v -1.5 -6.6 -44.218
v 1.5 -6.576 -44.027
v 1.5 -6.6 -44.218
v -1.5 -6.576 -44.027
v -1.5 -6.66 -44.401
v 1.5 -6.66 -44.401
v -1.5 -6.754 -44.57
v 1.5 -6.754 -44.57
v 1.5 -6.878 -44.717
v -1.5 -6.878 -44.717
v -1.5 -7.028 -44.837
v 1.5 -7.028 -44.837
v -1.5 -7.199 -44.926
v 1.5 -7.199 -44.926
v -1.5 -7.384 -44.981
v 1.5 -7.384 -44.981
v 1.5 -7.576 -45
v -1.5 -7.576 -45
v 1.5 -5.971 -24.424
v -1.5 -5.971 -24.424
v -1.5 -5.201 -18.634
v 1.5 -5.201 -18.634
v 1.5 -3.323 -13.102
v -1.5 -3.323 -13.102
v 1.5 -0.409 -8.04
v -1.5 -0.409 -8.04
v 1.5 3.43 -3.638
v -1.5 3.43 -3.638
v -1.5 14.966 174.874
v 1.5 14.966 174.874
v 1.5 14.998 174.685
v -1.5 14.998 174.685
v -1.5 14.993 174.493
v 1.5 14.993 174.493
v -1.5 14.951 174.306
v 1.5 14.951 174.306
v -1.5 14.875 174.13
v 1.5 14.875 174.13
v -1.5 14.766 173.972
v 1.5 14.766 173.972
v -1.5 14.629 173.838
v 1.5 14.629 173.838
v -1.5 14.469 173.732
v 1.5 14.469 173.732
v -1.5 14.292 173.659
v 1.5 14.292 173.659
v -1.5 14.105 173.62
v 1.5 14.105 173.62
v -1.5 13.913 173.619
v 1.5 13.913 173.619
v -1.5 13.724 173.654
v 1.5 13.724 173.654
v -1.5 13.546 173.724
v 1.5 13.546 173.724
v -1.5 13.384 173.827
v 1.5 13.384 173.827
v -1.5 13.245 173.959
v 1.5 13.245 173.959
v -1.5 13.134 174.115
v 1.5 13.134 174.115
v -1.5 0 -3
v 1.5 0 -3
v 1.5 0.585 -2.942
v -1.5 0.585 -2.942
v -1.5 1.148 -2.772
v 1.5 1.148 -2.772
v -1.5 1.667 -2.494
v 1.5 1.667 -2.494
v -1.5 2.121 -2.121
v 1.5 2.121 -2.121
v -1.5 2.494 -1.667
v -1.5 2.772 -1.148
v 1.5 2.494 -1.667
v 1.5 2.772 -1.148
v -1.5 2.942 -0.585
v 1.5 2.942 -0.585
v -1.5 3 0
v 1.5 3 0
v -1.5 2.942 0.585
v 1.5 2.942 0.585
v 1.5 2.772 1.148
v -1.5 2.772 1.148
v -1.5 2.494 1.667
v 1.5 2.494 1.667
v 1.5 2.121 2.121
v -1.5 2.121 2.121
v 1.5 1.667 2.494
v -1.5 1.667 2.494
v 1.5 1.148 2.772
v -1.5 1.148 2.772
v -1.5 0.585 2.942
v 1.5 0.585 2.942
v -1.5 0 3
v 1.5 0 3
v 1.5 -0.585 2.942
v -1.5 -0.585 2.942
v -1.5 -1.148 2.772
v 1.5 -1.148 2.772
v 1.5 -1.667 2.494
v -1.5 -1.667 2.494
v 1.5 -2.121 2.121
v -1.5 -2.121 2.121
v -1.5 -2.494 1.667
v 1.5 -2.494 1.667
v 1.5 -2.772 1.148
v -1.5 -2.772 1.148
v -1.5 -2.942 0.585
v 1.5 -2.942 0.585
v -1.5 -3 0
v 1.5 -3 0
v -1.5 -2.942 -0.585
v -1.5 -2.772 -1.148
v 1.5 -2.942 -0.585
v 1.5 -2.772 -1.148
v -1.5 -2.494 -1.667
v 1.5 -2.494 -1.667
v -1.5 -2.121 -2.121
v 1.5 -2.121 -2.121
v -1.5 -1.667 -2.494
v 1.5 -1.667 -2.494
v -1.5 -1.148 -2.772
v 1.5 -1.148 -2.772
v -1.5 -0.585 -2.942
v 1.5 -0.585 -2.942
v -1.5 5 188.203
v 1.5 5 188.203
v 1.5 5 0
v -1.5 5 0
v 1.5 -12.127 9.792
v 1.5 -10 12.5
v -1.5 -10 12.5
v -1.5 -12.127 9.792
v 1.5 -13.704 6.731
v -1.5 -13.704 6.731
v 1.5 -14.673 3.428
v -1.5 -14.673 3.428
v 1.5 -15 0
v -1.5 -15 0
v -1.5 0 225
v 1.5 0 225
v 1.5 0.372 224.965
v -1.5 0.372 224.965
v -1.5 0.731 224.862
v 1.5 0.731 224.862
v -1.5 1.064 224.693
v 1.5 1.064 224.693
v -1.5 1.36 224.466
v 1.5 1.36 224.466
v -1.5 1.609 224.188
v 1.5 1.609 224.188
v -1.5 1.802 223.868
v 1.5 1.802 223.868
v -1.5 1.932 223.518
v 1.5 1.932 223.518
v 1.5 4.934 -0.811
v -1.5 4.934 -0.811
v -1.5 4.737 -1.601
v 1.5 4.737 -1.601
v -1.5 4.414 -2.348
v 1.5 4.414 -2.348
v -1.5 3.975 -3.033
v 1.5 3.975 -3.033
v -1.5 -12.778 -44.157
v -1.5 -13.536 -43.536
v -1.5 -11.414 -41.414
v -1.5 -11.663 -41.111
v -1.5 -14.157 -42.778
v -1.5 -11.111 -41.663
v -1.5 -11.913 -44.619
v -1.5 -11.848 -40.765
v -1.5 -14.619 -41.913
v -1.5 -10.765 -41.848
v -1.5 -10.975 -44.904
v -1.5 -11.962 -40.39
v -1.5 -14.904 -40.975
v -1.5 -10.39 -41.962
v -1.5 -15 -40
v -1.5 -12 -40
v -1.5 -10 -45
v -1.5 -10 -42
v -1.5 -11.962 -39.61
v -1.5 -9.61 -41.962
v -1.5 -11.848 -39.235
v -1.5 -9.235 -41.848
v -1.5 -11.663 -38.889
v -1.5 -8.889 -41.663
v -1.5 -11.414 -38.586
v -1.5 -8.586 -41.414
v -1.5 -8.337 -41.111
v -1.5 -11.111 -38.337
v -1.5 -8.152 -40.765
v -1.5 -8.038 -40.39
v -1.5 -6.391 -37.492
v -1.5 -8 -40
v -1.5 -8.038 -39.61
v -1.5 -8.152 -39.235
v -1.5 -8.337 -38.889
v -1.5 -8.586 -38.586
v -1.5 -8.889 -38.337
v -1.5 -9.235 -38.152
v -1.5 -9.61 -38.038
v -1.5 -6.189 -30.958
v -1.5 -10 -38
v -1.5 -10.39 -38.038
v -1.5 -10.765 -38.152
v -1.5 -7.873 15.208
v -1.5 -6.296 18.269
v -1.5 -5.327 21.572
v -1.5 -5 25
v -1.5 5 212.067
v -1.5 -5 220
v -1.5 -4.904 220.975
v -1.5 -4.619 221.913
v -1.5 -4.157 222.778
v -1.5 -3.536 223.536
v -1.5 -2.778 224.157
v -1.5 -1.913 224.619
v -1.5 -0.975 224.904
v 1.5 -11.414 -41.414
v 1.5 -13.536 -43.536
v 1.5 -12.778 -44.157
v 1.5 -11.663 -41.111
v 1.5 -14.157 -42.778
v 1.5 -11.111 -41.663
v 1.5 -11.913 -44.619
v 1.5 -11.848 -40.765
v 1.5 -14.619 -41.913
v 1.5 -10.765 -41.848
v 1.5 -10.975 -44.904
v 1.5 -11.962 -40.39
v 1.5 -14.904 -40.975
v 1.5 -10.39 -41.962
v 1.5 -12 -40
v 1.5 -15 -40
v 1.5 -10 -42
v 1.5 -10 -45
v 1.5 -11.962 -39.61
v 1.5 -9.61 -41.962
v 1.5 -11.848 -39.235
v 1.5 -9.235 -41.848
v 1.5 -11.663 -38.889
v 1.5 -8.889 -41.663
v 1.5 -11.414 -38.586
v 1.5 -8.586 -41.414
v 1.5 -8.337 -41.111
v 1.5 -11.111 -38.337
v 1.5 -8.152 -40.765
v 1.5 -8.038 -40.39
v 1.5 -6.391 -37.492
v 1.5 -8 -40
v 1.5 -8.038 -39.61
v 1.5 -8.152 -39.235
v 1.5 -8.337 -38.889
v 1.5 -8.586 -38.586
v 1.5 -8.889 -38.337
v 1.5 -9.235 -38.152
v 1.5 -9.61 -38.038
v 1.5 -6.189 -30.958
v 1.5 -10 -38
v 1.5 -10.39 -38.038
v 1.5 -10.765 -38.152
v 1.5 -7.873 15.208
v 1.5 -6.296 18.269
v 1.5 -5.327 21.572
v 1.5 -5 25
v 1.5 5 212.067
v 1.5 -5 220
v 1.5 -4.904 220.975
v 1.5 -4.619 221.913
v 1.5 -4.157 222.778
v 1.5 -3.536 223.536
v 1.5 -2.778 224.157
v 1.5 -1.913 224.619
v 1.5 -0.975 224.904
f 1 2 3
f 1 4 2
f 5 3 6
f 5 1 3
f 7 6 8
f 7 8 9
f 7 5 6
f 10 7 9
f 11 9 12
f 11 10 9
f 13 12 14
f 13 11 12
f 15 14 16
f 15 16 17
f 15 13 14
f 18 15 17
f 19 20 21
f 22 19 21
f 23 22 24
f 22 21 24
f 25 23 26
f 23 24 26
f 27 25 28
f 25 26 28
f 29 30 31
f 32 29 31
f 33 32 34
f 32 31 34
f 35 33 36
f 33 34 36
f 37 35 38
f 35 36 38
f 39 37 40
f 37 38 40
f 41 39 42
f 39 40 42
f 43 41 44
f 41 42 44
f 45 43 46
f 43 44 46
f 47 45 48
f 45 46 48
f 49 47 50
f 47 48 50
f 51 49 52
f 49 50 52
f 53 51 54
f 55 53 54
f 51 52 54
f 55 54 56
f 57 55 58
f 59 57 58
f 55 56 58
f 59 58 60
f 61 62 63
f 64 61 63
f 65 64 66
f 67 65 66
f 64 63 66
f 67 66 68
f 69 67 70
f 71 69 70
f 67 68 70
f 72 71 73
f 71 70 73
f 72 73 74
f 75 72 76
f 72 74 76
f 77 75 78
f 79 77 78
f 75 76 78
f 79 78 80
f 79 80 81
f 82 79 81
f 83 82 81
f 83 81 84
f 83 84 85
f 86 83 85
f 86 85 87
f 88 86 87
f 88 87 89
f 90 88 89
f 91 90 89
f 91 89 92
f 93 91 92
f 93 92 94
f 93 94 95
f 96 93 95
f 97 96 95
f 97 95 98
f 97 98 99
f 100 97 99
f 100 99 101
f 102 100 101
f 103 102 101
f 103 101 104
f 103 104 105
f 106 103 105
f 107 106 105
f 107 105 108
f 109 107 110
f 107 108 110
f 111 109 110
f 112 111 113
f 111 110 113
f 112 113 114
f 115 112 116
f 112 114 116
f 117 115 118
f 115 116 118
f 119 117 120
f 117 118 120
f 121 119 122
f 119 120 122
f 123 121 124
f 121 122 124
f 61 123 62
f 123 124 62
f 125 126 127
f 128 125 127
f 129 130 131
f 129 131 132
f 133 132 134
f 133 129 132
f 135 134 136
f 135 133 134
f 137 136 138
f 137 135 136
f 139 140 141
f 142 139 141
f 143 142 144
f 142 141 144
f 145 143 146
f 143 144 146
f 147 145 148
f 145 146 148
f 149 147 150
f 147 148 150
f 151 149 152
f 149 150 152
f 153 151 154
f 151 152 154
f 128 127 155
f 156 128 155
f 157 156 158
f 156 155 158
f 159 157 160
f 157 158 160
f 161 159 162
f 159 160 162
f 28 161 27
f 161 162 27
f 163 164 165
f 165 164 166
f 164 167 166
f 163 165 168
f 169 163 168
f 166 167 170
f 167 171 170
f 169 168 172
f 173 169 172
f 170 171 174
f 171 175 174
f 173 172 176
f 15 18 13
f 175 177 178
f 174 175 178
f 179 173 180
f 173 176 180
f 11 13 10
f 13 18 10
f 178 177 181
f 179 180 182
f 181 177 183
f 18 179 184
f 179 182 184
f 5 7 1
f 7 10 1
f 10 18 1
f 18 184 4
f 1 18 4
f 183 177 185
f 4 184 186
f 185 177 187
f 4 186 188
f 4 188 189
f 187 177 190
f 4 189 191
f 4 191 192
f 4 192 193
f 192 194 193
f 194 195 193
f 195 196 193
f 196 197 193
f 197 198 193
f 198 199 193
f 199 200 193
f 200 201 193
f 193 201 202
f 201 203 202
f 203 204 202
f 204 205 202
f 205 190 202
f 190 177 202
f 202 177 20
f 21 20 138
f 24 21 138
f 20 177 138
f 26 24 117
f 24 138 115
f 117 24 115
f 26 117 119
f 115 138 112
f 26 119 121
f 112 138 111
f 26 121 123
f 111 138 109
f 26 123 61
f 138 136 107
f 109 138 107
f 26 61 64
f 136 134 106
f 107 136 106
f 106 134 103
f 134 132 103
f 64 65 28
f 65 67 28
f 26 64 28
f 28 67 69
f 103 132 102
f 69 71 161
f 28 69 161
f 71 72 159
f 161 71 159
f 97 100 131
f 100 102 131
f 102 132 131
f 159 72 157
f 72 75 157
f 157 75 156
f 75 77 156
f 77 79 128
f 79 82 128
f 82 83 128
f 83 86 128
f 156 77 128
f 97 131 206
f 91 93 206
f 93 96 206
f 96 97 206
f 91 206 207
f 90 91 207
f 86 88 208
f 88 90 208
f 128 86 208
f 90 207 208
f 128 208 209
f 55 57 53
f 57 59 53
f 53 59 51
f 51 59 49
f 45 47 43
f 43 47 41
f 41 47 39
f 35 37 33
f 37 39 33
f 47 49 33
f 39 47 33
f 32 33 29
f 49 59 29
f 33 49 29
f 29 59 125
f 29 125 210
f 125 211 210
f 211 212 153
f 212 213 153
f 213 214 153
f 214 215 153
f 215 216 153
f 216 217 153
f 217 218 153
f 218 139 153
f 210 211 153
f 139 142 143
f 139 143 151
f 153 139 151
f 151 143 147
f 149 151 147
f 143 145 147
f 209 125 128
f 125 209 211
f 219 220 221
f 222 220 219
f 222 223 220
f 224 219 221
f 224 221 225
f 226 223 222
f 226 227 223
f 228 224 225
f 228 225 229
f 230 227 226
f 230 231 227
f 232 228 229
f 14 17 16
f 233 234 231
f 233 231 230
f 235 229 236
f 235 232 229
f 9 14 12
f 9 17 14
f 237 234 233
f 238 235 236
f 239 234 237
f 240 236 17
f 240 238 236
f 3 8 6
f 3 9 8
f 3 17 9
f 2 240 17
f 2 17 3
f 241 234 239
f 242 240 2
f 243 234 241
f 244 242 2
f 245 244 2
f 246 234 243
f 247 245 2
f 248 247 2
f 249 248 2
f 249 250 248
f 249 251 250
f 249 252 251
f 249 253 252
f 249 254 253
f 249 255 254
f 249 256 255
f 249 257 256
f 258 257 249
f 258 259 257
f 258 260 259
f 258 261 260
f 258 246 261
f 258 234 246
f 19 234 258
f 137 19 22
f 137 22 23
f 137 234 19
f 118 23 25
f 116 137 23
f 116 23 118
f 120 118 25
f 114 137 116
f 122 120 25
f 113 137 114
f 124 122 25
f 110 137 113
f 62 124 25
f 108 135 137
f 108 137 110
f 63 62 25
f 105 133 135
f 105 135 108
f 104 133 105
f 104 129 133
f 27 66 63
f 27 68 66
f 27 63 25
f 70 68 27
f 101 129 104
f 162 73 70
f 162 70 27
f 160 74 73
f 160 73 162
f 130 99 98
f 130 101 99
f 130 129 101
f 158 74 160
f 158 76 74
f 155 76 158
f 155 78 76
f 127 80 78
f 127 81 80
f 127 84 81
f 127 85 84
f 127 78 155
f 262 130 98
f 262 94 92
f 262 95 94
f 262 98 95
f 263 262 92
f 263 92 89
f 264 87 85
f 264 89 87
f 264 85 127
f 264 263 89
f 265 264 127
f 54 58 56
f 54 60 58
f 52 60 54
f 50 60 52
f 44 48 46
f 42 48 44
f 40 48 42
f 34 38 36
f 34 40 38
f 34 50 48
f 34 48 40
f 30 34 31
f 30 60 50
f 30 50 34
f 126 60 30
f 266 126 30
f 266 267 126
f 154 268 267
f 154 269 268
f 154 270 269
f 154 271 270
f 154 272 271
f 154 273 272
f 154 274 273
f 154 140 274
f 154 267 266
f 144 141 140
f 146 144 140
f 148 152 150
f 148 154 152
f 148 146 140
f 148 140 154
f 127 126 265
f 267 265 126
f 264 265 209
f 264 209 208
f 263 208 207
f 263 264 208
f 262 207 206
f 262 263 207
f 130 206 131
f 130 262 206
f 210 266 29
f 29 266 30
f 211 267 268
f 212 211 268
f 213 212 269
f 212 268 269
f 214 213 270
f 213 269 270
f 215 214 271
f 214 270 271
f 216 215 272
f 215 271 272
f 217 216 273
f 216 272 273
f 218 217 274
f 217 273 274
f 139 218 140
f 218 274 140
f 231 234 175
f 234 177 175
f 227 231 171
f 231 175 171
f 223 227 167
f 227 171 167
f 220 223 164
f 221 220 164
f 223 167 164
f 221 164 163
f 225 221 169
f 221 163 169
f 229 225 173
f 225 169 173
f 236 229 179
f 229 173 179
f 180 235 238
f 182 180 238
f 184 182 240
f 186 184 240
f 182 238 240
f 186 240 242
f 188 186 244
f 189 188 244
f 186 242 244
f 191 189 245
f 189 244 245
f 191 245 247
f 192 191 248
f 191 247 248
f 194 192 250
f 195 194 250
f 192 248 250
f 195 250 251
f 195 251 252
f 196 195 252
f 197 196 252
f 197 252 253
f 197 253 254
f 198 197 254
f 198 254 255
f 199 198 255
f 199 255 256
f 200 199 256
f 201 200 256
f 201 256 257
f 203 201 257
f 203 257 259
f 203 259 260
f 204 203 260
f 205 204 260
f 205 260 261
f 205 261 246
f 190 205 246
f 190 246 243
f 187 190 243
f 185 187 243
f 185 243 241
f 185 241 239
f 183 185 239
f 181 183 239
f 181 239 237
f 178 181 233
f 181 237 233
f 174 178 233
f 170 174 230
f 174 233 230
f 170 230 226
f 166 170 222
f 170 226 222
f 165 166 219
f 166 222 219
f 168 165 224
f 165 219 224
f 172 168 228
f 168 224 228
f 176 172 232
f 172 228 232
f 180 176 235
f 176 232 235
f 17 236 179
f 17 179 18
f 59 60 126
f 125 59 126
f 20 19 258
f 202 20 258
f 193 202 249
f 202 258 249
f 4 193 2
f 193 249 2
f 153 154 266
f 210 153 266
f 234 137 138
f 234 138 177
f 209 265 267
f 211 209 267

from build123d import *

# Parameters (mm, degrees)
EXTRUDE_1_DEPTH     = 1.5
EXTRUDE_2_DEPTH     = 3
CUT_EXTRUDE_1_DEPTH = 226.519400496
SKETCH_4_W          = 70
SKETCH_4_H          = 10
EXTRUDE_3_DEPTH     = 3
CUT_EXTRUDE_2_DEPTH = 226.519400496
FILLET_1_R          = 5
FILLET_START        = -1.5
FILLET_2_DEPTH      = 3
FILLET_3_R          = 1
CUT_EXTRUDE_3_DEPTH = 226.519400496
SKETCH_7_R          = 3
CUT_EXTRUDE_4_DEPTH = 226.519400496
SKETCH_8_R          = 2
CUT_EXTRUDE_5_DEPTH = 226.519400496


with BuildPart() as part:
    # ｽｹｯﾁ1 → ﾎﾞｽ - 押し出し1 (new, symmetric)
    with BuildSketch(Plane(origin=(0, 0, 0), x_dir=(0, 0, -1), z_dir=(1, 0, 0))):
        with BuildLine():
            Line((0, -5), (-220, -5))
            ThreePointArc((-220, -5), (-225, 0), (-220, 5))
            Line((-220, 5), (0, 5))
            ThreePointArc((0, 5), (5, 0), (0, -5))
        make_face()
    extrude(amount=EXTRUDE_1_DEPTH, both=True)

    # ｽｹｯﾁ2 → ﾎﾞｽ - 押し出し2 (add)
    with BuildSketch(Plane(origin=(1.5, 0, 0), x_dir=(0, 0, -1), z_dir=(1, 0, 0))):
        with BuildLine():
            Line((-223.51763809, 1.931851653), (-174.873811044, 14.965925826))
            ThreePointArc((-174.873811044, 14.965925826), (-173.691112467, 14.382683432), (-174.114991999, 13.133974596))
            Line((-174.114991999, 13.133974596), (-196.863703305, 0))
            Line((-196.863703305, 0), (-225, 0))
            ThreePointArc((-225, 0), (-224.586706681, 1.217522858), (-223.51763809, 1.931851653))
        make_face()
    extrude(amount=-EXTRUDE_2_DEPTH)

    # ｽｹｯﾁ3 → ｶｯﾄ - 押し出し1 (cut, through all)
    with BuildSketch(Plane(origin=(1.5, 0, 0), x_dir=(0, 0, -1), z_dir=(1, 0, 0))):
        with BuildLine():
            Line((-223.51763809, 1.931851653), (-212.067152572, 5))
            Line((-212.067152572, 5), (-220, 5))
            ThreePointArc((-220, 5), (-223.535533906, 3.535533906), (-225, 0))
            ThreePointArc((-225, 0), (-224.586706681, 1.217522858), (-223.51763809, 1.931851653))
        make_face()
    extrude(amount=-CUT_EXTRUDE_1_DEPTH, mode=Mode.SUBTRACT)

    # ｽｹｯﾁ4 → ﾎﾞｽ - 押し出し3 (add)
    with BuildSketch(Plane(origin=(1.5, 0, 0), x_dir=(0, 0, -1), z_dir=(1, 0, 0))):
        with Locations((10, -10)):
            Rectangle(SKETCH_4_W, SKETCH_4_H)
    extrude(amount=-EXTRUDE_3_DEPTH)

    # ｽｹｯﾁ5 → ｶｯﾄ - 押し出し2 (cut, through all)
    with BuildSketch(Plane(origin=(1.5, 0, 0), x_dir=(0, 0, -1), z_dir=(1, 0, 0))):
        with BuildLine():
            ThreePointArc((-0.222112537, -4.995064166), (22.385361516, -5.899367469), (45, -6.602057872))
            Line((45, -6.602057872), (45, -5))
            Line((45, -5), (0, -5))
            ThreePointArc((0, -5), (-0.111083686, -4.998765889), (-0.222112537, -4.995064166))
        make_face()
    extrude(amount=-CUT_EXTRUDE_2_DEPTH, mode=Mode.SUBTRACT)

    # ﾌｨﾚｯﾄ1
    fillet_1_edges = [part.edges().sort_by_distance(p)[0] for p in [
        (0, -15, -45),
    ]]
    fillet(fillet_1_edges, radius=FILLET_1_R)

    # ﾌｨﾚｯﾄ2: read off the stored shape, not the designer's step
    # ﾌｨﾚｯﾄ2 outline → ﾌｨﾚｯﾄ2 (add)
    with BuildSketch(Plane.YZ.offset(FILLET_START)):
        with BuildLine():
            ThreePointArc((-5.97098694, -24.423877243), (-3.3233227, -13.102392567), (3.430133723, -3.637881615))
            ThreePointArc((3.430133723, -3.637881615), (-2.082580259, -4.54564181), (-4.995064166, 0.222112537))
            ThreePointArc((-4.995064166, 0.222112537), (-5.512971584, -12.099696561), (-5.97098694, -24.423877243))
        make_face()
    extrude(amount=FILLET_2_DEPTH)

    # ﾌｨﾚｯﾄ3
    fillet_3_edges = [part.edges().sort_by_distance(p)[0] for p in [
        (0, -6.602057872, -45),
    ]]
    fillet(fillet_3_edges, radius=FILLET_3_R)

    # ｽｹｯﾁ6 → ｶｯﾄ - 押し出し3 (cut, through all)
    with BuildSketch(Plane(origin=(1.5, 0, 0), x_dir=(0, 0, -1), z_dir=(1, 0, 0))):
        with BuildLine():
            Line((0, -15), (-25, -15))
            Line((-25, -15), (-25, -5))
            ThreePointArc((-25, -5), (-18.268543991, -6.296359978), (-12.5, -10))
            ThreePointArc((-12.5, -10), (-6.731456009, -13.703640022), (0, -15))
        make_face()
    extrude(amount=-CUT_EXTRUDE_3_DEPTH, mode=Mode.SUBTRACT)

    # ｽｹｯﾁ7 → ｶｯﾄ - 押し出し4 (cut, through all)
    with BuildSketch(Plane(origin=(1.5, 0, 0), x_dir=(0, 0, -1), z_dir=(1, 0, 0))):
        Circle(SKETCH_7_R)
    extrude(amount=-CUT_EXTRUDE_4_DEPTH, mode=Mode.SUBTRACT)

    # ｽｹｯﾁ8 → ｶｯﾄ - 押し出し5 (cut, through all)
    with BuildSketch(Plane(origin=(1.5, 0, 0), x_dir=(0, 0, -1), z_dir=(1, 0, 0))):
        with Locations((40, -10)):
            Circle(SKETCH_8_R)
    extrude(amount=-CUT_EXTRUDE_5_DEPTH, mode=Mode.SUBTRACT)


solid = part.part
